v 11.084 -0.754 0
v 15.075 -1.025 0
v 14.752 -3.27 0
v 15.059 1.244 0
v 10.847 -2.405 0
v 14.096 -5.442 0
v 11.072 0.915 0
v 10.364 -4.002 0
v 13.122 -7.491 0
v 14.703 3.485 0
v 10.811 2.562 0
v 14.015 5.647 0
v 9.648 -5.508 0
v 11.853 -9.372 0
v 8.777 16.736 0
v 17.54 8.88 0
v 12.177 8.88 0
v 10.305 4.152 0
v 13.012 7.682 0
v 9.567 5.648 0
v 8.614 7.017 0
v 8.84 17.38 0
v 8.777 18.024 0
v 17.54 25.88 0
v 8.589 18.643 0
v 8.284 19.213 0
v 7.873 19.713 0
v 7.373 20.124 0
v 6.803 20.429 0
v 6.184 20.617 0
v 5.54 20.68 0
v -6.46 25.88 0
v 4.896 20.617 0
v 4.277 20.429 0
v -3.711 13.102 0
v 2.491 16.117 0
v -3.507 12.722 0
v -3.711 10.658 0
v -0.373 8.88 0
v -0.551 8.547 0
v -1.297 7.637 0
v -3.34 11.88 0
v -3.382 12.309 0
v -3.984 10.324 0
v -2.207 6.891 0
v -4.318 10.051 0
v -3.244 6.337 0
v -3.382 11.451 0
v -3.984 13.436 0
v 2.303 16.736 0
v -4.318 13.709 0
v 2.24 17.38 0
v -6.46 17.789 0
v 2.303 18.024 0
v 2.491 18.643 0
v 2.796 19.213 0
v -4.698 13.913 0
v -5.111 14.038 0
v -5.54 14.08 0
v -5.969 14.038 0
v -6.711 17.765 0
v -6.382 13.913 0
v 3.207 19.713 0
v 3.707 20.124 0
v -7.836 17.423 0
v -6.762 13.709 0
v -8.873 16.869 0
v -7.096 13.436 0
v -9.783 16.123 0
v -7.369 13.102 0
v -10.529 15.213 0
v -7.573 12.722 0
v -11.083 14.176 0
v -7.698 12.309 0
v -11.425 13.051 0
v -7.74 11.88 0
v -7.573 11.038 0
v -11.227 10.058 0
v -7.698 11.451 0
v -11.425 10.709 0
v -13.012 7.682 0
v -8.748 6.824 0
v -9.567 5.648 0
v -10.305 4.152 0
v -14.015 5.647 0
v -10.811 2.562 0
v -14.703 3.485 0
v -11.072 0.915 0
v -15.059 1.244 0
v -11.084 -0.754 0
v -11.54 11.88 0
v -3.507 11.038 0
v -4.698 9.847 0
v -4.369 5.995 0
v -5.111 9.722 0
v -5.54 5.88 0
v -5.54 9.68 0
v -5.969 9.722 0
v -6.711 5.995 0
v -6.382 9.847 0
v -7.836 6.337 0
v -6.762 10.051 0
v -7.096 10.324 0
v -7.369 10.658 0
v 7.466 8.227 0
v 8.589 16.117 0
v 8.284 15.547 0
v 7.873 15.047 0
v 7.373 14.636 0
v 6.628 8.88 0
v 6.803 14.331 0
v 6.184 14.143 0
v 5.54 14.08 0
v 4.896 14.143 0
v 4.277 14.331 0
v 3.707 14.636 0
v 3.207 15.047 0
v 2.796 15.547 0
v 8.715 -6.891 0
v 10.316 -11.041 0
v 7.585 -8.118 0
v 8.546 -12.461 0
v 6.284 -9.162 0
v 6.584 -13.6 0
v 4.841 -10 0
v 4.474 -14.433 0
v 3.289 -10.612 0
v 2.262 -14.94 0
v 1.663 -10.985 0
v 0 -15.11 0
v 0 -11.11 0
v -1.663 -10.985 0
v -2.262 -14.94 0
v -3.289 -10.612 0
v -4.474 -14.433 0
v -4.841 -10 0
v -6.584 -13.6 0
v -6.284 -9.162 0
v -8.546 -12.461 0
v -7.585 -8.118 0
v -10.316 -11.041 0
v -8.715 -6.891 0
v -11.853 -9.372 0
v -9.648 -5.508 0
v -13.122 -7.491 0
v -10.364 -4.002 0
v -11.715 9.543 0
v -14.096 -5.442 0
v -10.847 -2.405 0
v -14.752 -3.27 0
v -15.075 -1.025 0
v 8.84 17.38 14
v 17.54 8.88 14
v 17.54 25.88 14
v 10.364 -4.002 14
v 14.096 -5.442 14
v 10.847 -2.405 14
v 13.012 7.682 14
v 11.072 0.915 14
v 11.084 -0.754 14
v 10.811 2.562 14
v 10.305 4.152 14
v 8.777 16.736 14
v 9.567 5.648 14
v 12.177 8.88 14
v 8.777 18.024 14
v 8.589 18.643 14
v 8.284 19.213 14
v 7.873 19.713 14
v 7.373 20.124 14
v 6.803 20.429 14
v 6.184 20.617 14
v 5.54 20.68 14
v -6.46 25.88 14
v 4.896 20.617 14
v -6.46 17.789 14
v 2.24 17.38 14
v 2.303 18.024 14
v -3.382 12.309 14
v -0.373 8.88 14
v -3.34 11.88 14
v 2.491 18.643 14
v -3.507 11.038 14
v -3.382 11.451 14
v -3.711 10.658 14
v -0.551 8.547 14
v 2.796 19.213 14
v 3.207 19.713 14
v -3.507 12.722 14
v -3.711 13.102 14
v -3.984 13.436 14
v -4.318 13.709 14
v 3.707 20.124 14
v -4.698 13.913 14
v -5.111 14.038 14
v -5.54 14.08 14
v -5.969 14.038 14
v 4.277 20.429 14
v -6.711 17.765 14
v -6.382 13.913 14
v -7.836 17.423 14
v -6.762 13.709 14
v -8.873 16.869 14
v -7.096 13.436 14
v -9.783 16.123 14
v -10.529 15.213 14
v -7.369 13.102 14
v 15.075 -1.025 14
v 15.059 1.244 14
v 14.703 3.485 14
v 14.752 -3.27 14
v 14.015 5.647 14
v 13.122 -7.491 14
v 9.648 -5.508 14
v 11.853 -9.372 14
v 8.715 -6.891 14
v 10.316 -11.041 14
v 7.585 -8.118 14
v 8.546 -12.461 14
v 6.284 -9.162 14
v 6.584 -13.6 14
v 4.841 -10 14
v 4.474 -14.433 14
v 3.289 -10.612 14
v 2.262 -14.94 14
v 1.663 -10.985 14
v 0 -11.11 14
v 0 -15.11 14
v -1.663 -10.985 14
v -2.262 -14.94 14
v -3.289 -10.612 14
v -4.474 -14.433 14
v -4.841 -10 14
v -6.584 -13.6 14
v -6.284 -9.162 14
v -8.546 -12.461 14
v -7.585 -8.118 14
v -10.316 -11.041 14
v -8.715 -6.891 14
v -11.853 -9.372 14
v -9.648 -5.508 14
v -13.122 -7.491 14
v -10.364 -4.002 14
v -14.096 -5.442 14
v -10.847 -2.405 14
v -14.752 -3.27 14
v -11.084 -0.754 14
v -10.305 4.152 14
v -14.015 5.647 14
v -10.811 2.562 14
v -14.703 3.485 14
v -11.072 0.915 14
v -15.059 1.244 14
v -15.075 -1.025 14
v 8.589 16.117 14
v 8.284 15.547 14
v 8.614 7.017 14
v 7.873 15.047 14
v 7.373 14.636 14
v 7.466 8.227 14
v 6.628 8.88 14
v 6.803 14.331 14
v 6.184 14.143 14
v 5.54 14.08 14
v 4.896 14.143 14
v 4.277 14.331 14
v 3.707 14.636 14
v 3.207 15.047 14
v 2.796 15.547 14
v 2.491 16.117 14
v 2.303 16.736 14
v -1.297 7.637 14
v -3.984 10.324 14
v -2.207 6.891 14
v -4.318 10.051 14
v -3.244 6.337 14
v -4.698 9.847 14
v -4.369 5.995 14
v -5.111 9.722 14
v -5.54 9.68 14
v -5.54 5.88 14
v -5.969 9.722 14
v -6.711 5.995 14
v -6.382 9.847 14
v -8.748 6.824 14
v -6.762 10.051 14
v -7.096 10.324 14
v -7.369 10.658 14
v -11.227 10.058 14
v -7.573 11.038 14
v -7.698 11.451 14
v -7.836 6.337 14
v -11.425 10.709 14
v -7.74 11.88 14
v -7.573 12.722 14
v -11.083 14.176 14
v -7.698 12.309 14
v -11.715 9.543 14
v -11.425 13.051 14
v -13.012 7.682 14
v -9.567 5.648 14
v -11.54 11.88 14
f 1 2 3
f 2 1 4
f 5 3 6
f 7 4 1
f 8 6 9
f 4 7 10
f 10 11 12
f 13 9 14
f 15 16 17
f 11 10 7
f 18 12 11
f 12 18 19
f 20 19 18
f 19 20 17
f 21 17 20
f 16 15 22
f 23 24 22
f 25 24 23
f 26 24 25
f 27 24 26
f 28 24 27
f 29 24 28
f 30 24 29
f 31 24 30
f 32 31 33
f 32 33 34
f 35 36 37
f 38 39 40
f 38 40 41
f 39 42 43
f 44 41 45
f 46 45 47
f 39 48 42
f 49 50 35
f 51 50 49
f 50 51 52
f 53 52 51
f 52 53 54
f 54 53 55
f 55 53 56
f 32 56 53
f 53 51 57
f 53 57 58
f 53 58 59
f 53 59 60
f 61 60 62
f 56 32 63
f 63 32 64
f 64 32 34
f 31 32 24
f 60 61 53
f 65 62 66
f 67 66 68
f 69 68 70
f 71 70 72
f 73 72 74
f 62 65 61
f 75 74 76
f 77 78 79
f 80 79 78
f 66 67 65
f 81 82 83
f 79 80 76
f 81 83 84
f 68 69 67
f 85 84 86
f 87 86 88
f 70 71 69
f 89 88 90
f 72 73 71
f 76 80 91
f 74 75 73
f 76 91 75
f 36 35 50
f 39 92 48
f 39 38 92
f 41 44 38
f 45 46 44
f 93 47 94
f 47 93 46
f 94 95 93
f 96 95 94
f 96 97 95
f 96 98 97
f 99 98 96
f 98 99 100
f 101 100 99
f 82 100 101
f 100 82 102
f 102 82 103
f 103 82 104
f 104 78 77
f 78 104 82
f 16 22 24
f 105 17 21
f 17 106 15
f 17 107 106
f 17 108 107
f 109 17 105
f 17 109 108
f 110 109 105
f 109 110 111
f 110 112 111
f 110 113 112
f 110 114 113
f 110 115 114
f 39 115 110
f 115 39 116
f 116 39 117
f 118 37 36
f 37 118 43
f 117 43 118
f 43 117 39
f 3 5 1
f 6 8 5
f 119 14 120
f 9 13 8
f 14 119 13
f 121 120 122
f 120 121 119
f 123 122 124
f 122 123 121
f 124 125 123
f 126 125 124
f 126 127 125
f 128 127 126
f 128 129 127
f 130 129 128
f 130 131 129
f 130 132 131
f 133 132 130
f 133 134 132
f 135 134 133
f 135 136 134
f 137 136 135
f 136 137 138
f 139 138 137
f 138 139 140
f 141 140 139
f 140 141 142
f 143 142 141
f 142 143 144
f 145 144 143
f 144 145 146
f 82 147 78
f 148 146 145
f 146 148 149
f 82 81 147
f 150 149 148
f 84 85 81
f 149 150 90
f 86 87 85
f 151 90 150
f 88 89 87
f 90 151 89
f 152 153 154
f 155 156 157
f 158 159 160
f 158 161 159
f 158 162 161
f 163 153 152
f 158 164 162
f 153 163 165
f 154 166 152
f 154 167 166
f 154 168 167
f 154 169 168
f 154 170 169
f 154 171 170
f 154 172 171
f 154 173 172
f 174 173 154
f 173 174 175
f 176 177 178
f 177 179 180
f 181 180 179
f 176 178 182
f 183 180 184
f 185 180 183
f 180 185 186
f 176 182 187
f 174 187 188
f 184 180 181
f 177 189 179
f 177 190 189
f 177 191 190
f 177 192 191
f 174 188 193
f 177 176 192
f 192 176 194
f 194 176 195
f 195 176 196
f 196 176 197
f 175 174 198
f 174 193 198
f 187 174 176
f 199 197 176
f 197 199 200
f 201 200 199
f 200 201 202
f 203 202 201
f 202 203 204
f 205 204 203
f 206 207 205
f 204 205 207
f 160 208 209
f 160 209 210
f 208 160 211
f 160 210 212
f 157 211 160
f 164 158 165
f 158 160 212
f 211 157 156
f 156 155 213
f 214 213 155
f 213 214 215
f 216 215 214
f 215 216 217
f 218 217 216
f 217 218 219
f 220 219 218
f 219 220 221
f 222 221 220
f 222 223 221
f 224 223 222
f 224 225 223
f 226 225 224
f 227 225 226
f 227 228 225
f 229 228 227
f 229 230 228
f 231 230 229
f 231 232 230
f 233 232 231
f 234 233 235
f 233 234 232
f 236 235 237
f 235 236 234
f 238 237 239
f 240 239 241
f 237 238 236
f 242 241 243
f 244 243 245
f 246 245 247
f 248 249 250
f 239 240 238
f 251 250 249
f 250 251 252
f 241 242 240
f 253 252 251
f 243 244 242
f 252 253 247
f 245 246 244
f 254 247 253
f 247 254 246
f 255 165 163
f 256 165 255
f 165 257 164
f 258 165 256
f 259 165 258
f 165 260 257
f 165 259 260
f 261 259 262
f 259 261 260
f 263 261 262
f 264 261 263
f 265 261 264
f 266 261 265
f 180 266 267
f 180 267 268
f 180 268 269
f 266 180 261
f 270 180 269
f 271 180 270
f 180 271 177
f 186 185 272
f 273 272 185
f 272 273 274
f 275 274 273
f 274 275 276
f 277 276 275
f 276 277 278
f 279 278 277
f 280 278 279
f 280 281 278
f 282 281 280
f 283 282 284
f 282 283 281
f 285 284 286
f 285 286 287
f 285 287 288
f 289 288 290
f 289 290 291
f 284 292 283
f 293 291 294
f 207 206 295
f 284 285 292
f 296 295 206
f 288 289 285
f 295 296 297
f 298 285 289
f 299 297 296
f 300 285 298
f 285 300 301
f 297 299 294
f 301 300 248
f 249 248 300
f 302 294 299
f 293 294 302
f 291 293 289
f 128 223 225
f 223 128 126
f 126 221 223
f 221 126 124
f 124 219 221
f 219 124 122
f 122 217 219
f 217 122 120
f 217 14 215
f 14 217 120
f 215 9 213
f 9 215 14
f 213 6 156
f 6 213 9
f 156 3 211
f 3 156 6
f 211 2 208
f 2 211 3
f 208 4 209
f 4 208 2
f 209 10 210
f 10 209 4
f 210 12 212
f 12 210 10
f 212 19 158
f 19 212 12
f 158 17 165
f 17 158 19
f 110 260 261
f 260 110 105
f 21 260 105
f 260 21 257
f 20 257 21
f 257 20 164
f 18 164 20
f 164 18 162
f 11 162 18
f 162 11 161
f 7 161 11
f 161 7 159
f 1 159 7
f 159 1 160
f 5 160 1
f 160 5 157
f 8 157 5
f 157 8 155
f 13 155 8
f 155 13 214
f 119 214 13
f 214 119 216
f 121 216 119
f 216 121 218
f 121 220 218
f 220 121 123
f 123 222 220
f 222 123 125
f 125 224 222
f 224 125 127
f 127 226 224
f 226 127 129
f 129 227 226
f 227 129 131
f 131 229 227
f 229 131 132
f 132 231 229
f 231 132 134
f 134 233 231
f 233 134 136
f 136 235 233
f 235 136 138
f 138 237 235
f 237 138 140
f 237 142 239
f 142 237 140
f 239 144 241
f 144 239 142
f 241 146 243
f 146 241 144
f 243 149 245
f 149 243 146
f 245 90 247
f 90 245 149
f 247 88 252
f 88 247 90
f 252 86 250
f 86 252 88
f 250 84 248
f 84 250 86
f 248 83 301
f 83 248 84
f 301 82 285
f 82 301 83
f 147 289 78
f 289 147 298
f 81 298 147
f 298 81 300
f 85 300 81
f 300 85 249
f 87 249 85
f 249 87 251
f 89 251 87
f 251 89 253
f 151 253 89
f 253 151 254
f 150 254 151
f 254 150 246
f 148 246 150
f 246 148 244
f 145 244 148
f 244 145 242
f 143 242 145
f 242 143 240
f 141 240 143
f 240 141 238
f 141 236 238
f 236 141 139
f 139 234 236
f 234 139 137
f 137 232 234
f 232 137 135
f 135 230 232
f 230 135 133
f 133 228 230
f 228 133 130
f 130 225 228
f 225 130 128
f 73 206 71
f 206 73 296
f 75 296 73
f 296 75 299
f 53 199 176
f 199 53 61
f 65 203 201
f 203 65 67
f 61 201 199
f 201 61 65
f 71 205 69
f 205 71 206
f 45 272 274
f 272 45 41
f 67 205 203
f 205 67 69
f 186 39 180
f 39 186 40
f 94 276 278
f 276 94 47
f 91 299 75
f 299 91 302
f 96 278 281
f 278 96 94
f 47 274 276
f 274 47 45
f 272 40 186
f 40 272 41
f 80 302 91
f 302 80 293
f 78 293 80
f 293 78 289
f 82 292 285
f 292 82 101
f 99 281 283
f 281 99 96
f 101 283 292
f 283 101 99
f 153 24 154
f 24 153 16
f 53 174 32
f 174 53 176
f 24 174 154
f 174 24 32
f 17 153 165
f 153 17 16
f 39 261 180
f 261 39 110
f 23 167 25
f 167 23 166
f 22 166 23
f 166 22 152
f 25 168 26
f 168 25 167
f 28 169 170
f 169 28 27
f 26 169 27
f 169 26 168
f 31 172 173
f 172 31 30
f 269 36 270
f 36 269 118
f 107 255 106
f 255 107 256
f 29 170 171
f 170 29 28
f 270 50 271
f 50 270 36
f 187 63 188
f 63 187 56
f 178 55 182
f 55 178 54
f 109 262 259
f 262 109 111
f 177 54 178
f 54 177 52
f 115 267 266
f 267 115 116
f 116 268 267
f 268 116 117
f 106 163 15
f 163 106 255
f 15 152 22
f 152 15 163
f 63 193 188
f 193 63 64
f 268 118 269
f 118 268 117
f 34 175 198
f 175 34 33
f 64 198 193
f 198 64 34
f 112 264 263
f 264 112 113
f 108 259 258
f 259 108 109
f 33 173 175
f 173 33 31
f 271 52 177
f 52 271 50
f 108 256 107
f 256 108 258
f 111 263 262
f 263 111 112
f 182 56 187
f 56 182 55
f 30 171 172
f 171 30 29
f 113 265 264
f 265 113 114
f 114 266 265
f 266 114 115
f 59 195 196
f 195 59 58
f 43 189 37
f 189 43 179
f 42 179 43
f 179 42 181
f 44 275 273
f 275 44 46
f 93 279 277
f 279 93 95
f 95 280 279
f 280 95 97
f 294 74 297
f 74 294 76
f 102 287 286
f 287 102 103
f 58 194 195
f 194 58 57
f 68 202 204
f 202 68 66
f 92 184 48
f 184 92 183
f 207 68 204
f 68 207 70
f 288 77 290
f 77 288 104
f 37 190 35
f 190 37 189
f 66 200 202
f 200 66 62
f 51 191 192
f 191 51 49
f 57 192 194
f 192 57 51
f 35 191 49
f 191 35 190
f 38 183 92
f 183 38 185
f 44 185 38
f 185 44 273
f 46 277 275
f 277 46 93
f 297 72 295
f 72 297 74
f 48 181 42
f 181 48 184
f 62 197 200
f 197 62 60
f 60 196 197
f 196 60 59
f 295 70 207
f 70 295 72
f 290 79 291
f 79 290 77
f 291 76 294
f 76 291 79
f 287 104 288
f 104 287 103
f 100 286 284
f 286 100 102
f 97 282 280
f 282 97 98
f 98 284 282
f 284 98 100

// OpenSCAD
$fn = 32;

// ----------------------------------------------------------------------
// Pipe clamp: 30.22 mm ring, 4 mm wall, 14 mm wide
// ----------------------------------------------------------------------

// --- parameters (mm) ---
outer_r = 15.11;          // clamp outside radius
inner_r = 11.11;          // pipe bore radius
band = 4;                 // band thickness
clamp_w = 14;             // clamp width
opening = 50;             // opening angle between the ends
lug_w = 24;               // lug width
lug_len = 17;             // lug length
bolt_d = 6.6;             // bolt hole
knuckle_d = 12;           // hinge knuckle diameter
pin_d = 4.4;              // hinge pin hole

clamp_profile = [[-6.386, 13.694], [-8.364, 12.584], [-10.154, 11.19], [-11.715, 9.543], [-13.012, 7.682], [-14.015, 5.647], [-14.703, 3.485], [-15.059, 1.244], [-15.075, -1.025], [-14.752, -3.27], [-14.096, -5.442], [-13.122, -7.491], [-11.853, -9.372], [-10.316, -11.041], [-8.546, -12.461], [-6.584, -13.6], [-4.474, -14.433], [-2.262, -14.94], [0, -15.11], [2.262, -14.94], [4.474, -14.433], [6.584, -13.6], [8.546, -12.461], [10.316, -11.041], [11.853, -9.372], [13.122, -7.491], [14.096, -5.442], [14.752, -3.27], [15.075, -1.025], [15.059, 1.244], [14.703, 3.485], [14.015, 5.647], [13.012, 7.682], [11.715, 9.543], [10.154, 11.19], [8.364, 12.584], [6.386, 13.694], [4.695, 10.069], [6.15, 9.253], [7.466, 8.227], [8.614, 7.017], [9.567, 5.648], [10.305, 4.152], [10.811, 2.562], [11.072, 0.915], [11.084, -0.754], [10.847, -2.405], [10.364, -4.002], [9.648, -5.508], [8.715, -6.891], [7.585, -8.118], [6.284, -9.162], [4.841, -10], [3.289, -10.612], [1.663, -10.985], [0, -11.11], [-1.663, -10.985], [-3.289, -10.612], [-4.841, -10], [-6.284, -9.162], [-7.585, -8.118], [-8.715, -6.891], [-9.648, -5.508], [-10.364, -4.002], [-10.847, -2.405], [-11.084, -0.754], [-11.072, 0.915], [-10.811, 2.562], [-10.305, 4.152], [-9.567, 5.648], [-8.614, 7.017], [-7.466, 8.227], [-6.15, 9.253], [-4.695, 10.069]];

difference() {
  union() {
    linear_extrude(height = clamp_w) polygon(clamp_profile);
    /* hinge knuckle, sunk 2 mm into the band end */
    translate([-5.54, 11.88, 0]) cylinder(h = clamp_w, d = knuckle_d);
    /* bolt lug on the other end */
    translate([-6.46, 8.88, 0]) cube([lug_w, 17, clamp_w]);
  }
  translate([5.54, 17.38, -2.5]) cylinder(h = clamp_w + 5, d = bolt_d);
  translate([-5.54, 11.88, -2.5]) cylinder(h = clamp_w + 5, d = pin_d);
}
